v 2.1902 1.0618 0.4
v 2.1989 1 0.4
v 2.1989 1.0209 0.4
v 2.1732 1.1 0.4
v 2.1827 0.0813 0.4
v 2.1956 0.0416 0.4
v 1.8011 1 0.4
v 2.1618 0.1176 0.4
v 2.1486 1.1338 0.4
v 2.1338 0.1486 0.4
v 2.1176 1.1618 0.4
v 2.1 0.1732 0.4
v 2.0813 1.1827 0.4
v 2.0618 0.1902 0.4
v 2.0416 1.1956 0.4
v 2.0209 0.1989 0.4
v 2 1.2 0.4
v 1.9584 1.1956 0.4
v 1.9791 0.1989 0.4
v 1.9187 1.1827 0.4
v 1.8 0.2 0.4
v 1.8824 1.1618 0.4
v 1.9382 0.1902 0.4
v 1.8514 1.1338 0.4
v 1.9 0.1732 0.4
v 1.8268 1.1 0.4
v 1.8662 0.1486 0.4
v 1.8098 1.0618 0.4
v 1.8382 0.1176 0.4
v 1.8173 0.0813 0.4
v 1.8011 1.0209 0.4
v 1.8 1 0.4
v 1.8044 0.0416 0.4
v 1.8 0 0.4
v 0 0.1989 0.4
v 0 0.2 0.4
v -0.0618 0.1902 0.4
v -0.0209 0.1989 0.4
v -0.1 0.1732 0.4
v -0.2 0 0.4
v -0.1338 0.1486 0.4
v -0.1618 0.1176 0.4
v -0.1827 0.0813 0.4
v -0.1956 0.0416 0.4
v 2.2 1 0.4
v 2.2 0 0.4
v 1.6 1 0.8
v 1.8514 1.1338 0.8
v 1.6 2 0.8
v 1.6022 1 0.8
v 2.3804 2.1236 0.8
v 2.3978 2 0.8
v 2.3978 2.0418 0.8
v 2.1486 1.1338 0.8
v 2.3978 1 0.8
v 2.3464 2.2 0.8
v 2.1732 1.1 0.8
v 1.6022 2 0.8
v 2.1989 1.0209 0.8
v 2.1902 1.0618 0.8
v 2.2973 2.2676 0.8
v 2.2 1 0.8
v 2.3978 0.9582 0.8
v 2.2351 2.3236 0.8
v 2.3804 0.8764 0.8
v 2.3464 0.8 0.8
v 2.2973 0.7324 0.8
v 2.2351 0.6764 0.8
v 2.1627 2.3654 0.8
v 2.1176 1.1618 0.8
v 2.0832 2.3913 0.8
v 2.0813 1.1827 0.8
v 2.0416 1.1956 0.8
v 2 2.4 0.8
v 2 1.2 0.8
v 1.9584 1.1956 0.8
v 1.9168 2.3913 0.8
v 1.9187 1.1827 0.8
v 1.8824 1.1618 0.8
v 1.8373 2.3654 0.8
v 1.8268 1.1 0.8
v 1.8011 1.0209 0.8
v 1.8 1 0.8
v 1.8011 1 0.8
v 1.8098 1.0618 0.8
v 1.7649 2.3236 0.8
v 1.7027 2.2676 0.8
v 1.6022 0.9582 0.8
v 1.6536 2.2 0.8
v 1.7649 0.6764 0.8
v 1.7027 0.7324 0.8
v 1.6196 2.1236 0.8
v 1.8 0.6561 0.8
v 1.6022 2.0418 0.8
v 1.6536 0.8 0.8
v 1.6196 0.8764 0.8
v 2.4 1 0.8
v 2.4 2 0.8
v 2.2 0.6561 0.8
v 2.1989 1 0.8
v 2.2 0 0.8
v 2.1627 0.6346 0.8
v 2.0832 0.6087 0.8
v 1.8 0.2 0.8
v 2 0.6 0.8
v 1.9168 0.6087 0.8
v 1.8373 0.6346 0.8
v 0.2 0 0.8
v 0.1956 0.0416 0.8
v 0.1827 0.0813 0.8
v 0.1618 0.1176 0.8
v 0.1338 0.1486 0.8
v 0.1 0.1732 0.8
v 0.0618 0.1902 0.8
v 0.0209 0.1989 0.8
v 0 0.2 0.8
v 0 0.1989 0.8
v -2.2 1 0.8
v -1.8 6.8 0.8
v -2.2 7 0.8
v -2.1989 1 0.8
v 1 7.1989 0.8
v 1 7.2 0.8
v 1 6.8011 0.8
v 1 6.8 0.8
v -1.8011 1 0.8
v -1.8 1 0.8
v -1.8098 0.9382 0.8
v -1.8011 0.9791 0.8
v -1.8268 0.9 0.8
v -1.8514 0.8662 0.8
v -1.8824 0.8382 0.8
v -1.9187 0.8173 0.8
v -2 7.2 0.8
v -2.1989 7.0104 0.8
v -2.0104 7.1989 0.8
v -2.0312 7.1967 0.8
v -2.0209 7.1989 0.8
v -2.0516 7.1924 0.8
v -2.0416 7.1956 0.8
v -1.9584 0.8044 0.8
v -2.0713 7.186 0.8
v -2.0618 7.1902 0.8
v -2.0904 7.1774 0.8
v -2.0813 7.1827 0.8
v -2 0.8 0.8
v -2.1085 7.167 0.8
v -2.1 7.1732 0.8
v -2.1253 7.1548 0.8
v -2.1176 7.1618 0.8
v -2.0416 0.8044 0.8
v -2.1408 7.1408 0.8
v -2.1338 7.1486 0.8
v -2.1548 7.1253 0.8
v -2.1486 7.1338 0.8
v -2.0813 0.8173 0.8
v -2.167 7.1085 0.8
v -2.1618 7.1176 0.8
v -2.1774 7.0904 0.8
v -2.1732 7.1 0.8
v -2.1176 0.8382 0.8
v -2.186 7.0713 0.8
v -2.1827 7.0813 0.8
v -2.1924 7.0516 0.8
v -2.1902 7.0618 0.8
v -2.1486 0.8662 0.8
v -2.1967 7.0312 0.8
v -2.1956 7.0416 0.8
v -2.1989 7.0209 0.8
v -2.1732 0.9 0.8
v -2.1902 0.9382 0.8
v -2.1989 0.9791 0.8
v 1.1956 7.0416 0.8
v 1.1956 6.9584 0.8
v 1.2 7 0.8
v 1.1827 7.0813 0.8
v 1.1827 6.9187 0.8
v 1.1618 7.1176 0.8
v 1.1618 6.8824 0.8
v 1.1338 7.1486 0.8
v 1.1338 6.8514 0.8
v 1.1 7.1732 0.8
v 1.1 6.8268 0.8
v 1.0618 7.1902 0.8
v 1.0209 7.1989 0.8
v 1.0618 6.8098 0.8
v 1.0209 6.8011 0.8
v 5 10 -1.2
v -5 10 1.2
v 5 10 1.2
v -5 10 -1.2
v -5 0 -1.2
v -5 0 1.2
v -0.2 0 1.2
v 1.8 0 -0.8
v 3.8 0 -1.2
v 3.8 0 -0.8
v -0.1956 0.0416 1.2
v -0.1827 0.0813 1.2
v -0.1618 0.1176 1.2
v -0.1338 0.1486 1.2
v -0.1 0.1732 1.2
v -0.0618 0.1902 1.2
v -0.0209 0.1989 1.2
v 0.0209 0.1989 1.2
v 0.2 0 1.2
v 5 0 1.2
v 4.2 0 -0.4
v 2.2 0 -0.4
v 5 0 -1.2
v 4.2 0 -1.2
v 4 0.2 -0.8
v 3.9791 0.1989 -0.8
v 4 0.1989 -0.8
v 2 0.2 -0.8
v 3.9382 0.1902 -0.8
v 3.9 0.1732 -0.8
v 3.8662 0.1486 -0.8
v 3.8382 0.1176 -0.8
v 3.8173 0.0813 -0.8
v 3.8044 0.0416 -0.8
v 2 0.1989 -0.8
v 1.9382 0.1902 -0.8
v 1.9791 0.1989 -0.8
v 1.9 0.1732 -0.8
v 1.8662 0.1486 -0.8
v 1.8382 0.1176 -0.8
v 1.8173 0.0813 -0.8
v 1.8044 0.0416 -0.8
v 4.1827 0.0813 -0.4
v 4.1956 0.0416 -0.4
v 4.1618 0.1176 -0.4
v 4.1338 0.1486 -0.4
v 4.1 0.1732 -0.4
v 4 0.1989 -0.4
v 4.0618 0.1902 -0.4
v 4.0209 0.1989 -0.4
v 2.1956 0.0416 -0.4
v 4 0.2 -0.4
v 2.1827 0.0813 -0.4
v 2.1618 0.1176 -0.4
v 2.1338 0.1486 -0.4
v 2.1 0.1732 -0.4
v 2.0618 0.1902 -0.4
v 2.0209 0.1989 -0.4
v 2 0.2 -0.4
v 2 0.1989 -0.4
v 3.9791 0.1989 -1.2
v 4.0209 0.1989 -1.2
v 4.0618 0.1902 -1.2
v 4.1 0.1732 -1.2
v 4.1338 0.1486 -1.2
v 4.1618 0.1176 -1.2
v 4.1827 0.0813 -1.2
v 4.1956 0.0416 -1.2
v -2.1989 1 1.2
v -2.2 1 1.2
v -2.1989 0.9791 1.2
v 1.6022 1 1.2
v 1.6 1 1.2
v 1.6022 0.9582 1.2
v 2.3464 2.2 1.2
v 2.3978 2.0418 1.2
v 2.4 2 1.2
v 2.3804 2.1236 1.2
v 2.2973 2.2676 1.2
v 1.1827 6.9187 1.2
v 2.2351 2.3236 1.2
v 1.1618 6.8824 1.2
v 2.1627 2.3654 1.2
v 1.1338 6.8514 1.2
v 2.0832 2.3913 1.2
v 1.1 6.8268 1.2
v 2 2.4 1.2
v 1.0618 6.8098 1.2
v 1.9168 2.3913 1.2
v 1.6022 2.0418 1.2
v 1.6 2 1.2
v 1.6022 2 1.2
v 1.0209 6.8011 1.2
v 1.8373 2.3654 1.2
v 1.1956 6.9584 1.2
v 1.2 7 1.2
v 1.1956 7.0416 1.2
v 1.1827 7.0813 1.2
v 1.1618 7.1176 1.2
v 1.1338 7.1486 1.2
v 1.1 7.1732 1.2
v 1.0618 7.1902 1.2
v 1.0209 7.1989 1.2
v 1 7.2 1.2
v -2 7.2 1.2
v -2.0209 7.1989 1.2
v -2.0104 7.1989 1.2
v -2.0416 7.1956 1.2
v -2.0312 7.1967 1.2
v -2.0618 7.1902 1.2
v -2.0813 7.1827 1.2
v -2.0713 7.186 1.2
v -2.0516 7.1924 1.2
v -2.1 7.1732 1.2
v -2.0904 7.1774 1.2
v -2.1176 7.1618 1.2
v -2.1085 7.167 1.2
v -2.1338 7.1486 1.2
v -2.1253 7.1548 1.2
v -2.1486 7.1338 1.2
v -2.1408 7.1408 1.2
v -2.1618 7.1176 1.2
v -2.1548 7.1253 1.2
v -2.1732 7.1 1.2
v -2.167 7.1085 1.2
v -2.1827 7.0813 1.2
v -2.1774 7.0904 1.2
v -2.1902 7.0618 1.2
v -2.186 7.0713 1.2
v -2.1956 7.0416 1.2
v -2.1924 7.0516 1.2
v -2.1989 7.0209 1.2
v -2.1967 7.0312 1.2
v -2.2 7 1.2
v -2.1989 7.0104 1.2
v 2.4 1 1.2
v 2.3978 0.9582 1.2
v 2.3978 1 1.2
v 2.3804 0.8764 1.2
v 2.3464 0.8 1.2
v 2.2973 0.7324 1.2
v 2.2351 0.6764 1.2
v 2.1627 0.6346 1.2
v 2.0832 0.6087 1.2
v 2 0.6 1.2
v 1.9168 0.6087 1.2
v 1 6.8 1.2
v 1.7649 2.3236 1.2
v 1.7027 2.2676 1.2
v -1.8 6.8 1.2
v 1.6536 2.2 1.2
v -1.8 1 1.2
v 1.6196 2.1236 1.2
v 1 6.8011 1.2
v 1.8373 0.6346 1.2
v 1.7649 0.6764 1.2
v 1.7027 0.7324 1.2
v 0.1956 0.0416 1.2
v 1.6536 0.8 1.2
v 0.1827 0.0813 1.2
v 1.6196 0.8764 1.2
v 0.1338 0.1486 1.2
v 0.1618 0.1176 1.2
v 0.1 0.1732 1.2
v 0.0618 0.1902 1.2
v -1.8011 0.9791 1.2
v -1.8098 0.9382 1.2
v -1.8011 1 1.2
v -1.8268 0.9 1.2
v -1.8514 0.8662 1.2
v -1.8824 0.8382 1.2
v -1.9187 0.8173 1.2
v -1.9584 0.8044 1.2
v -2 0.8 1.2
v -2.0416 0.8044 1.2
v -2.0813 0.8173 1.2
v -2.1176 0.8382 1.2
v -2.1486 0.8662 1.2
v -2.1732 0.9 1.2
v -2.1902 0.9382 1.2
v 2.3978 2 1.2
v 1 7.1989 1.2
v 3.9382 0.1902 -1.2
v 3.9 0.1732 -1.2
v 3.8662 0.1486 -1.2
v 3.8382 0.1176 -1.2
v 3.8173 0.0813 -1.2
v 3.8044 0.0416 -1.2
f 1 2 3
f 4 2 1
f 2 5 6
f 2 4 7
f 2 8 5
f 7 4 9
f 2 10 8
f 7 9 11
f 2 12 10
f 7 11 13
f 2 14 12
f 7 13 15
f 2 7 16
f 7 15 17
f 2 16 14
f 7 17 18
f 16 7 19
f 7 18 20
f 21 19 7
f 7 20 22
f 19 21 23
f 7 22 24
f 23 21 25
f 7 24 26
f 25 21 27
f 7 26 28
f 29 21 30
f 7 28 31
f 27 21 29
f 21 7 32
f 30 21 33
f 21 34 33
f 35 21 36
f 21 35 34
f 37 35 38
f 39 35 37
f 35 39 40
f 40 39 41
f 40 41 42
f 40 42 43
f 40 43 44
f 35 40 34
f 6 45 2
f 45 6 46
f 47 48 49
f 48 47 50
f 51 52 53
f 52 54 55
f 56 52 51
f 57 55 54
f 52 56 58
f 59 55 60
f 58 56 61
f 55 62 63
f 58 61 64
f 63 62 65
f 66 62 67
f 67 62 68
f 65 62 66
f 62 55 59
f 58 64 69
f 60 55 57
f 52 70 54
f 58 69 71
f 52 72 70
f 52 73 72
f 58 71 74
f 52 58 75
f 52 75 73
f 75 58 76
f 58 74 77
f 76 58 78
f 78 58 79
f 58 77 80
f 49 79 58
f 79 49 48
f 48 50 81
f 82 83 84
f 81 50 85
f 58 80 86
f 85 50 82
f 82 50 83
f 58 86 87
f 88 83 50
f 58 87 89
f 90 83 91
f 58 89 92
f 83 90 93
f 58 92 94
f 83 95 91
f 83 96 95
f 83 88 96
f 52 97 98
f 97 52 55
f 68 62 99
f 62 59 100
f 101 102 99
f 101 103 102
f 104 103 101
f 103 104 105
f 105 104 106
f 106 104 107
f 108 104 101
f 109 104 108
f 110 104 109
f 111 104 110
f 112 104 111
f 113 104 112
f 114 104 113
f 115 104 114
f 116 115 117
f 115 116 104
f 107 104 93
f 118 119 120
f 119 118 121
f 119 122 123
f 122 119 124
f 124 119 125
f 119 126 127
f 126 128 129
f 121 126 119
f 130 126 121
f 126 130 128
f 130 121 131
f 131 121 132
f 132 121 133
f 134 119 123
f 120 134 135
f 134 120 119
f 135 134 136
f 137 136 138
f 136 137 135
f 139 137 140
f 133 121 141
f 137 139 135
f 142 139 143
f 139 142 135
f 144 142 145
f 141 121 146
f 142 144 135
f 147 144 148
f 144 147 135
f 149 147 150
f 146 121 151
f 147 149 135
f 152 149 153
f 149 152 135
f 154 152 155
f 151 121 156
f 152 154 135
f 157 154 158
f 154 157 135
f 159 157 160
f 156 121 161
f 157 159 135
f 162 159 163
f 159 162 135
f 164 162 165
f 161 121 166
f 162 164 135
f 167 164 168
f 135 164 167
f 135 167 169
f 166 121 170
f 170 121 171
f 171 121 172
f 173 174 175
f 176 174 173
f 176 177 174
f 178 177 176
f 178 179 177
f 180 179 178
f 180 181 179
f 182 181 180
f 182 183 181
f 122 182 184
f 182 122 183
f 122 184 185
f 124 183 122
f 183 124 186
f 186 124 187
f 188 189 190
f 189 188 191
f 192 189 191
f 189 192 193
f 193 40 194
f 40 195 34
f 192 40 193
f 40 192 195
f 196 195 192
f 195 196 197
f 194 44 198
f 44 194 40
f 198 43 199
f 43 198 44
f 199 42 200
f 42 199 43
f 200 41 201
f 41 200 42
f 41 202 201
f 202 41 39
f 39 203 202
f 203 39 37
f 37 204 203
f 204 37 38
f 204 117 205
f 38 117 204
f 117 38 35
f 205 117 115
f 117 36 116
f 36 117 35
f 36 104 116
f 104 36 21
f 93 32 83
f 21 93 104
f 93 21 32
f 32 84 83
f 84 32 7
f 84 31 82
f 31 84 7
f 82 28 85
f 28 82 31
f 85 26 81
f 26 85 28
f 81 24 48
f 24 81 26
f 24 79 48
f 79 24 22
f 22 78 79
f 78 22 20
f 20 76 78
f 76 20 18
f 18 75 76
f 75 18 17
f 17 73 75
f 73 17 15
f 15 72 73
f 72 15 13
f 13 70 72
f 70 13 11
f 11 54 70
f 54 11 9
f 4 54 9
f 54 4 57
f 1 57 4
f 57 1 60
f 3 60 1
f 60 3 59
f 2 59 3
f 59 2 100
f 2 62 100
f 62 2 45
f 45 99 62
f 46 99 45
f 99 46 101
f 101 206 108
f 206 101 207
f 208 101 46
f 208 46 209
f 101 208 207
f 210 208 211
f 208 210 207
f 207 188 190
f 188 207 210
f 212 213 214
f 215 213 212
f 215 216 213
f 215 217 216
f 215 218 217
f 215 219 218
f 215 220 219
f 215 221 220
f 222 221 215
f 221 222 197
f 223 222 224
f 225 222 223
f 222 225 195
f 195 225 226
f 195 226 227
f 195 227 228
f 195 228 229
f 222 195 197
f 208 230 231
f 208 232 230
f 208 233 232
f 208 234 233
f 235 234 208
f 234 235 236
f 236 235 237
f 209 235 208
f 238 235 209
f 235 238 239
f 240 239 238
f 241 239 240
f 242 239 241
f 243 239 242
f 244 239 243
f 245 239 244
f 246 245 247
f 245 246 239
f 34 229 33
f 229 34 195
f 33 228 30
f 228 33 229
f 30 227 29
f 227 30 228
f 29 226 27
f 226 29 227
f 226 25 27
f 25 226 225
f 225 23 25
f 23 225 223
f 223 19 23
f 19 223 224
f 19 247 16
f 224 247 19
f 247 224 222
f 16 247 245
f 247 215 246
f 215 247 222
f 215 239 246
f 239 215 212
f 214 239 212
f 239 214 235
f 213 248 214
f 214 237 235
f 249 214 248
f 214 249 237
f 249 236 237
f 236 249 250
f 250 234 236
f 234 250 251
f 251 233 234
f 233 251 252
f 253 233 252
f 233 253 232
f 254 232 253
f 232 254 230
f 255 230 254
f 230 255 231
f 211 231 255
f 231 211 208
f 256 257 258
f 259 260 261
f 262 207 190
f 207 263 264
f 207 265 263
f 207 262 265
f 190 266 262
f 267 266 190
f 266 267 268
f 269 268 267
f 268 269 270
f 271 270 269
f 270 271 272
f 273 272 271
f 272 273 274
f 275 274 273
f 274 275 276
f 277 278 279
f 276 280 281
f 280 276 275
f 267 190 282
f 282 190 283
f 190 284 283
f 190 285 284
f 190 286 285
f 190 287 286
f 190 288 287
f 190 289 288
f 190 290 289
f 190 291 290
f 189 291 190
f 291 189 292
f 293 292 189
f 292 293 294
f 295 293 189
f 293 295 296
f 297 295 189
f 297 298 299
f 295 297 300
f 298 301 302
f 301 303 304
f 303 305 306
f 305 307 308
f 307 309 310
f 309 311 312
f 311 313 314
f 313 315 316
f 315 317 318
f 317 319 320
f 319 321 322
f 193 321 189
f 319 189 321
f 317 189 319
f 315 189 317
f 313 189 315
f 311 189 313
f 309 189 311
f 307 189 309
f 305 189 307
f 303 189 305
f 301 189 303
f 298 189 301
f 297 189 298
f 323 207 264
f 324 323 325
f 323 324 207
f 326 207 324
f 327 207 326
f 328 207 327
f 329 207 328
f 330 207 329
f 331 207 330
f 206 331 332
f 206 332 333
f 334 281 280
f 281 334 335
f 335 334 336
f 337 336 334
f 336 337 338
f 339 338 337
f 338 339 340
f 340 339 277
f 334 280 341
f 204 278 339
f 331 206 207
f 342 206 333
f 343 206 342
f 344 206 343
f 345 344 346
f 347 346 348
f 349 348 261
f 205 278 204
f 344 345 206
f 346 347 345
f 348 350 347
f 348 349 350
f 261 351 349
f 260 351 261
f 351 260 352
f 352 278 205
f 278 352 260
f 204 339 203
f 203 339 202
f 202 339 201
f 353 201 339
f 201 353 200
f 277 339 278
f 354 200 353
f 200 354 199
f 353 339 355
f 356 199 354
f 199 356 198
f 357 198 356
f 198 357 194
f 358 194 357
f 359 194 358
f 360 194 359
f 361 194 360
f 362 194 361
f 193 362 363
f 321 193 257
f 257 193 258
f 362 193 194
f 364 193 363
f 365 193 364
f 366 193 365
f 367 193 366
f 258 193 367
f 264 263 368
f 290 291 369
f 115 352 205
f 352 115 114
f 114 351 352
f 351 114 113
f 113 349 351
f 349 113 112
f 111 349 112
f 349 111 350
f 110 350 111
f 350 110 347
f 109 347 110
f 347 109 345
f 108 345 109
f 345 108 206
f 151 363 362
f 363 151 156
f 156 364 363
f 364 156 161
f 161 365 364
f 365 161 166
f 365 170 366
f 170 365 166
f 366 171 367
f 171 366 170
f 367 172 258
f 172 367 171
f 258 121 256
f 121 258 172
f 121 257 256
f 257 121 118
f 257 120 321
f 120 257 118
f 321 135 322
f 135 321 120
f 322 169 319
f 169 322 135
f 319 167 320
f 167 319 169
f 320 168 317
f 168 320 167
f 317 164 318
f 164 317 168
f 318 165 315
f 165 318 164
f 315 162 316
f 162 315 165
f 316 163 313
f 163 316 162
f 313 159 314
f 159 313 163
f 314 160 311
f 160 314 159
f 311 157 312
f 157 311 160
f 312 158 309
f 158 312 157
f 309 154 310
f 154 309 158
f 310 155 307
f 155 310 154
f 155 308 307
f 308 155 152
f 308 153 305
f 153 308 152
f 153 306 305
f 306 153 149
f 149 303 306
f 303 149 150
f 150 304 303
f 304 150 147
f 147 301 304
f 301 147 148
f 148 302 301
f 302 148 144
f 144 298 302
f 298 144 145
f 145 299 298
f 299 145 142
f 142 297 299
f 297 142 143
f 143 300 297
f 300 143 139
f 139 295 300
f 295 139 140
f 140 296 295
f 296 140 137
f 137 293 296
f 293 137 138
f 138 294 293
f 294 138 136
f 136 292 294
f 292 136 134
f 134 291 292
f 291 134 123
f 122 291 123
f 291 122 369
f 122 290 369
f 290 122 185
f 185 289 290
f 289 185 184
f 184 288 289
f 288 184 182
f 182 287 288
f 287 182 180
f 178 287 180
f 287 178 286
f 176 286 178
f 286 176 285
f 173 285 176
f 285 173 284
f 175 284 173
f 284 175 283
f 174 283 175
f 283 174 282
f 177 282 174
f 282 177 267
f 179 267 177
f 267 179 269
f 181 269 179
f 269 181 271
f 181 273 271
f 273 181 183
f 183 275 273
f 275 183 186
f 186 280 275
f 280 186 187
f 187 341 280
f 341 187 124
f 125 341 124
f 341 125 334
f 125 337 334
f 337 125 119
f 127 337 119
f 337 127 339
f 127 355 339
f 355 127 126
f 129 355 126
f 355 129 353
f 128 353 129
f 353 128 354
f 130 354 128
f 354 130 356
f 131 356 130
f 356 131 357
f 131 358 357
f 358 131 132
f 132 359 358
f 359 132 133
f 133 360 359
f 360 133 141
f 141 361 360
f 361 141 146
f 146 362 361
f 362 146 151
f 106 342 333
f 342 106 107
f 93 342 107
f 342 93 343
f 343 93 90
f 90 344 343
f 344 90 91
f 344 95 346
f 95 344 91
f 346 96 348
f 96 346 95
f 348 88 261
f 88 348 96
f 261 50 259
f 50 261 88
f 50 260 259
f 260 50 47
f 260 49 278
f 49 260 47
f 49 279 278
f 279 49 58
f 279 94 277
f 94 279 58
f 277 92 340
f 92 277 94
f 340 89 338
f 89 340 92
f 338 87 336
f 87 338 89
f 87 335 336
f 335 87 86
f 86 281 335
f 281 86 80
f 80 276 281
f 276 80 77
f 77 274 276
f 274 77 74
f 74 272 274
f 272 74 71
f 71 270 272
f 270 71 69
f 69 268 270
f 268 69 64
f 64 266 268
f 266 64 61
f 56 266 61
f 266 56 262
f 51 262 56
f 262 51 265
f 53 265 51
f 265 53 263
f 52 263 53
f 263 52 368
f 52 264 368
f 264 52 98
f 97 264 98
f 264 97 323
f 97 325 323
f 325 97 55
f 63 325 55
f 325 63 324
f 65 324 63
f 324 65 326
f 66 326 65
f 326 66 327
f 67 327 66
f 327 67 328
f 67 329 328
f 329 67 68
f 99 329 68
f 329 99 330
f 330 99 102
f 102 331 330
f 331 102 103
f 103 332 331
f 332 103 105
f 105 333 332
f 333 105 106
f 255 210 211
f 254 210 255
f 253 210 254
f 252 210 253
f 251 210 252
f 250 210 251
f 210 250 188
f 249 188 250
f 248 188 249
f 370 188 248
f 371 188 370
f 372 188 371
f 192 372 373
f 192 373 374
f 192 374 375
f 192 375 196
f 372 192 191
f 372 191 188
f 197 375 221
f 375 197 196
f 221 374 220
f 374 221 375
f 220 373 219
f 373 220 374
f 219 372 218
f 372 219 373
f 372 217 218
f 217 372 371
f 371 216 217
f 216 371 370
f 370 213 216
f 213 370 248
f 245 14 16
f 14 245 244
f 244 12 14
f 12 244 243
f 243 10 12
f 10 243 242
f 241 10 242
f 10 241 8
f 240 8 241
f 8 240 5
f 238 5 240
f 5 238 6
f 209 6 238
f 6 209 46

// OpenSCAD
// file: ../lib/kicad_graphics_items.scad
$fs = 0.01;

module draw_segment(
    start, // start point as 2-vector
    end, // end point as 2-vector
    width // width as number
) {
    vector = end - start;
    length = norm(vector);
    angle = atan2(vector[1], vector[0]);
    
    translate(start)
    rotate(angle) {
        translate([0, -width/2])
            square([length, width]);
        circle(d = width);
        translate([length, 0])
            circle(d = width);
    }
}

module draw_fp_line(
    start, // start point as 2-vector
    end, // end point as 2-vector
    width // width as number
) {
    draw_segment(
        start = start,
        end = end,
        width = width
    );
}

module draw_gr_poly(
    vertices, // list of vertices, as 2-vectors
    width, // stroke line width as number
    fill // whether to fill the shape, as boolean
) {
    for(i = [0 : len(vertices) - 2]) {
        draw_segment(
            start = vertices[i],
            end = vertices[i+1],
            width = width
        );
    }
    draw_segment(
        start = vertices[len(vertices) - 1],
        end = vertices[0],
        width = width
    );
    if(fill)
    polygon([
        for(v = vertices) v
    ]);
}

module draw_gr_rect(
    start, // start point as 2-vector
    end, // end point as 2-vector
    width, // stroke line width as number
    fill // whether to fill the shape, as boolean
) {
    draw_gr_poly(
        [
            start, [end.x, start.y],
            end, [start.x, end.y]
        ],
        width = width,
        fill = fill
    );
}

draw_fp_line([4, 5], [6, 7], 1);
// main file
use <../lib/kicad_graphics_items.scad>

// F.Cu
color("#ff8080")
translate([0, 0, 0.4])
linear_extrude(0.4)
difference() {
    translate([-5, 0, 0])
    square([10, 10]);
    draw_fp_line(
        start = [0.0, 0.0],
        end = [2.0, 0.0],
        width = 0.4
    );
    draw_fp_line(
        start = [2.0, 0.0],
        end = [2.0, 1.0],
        width = 0.4
    );
}

// B.Cu
color("#8080ff")
translate([0, 0, -0.8])
linear_extrude(0.4)
difference() {
    translate([-5, 0, 0])
    square([10, 10]);
    draw_fp_line(
        start = [2.0, 0.0],
        end = [4.0, 0.0],
        width = 0.4
    );
}

// F.Mask
color("#80ff80")
translate([0, 0, 0.8])
linear_extrude(0.4)
difference() {
    translate([-5, 0, 0])
    square([10, 10]);
    draw_fp_line(
        start = [0.0, 0.0],
        end = [0.0, 0.0],
        width = 0.4
    );
    draw_fp_line(
        start = [2.0, 1.0],
        end = [2.0, 2.0],
        width = 0.8
    );
    draw_fp_line(
        start = [-2.0, 1.0],
        end = [-2.0, 7.0],
        width = 0.4
    );
    draw_fp_line(
        start = [-2.0, 7.0],
        end = [1.0, 7.0],
        width = 0.4
    );
}

// B.Mask
color("#80ff80")
translate([0, 0, -1.2])
linear_extrude(0.4)
difference() {
    translate([-5, 0, 0])
    square([10, 10]);
    draw_fp_line(
        start = [4.0, 0.0],
        end = [4.0, 0.0],
        width = 0.4
    );
}

// Dielectric
color("#808080")
translate([0, 0, -0.4])
linear_extrude(0.8)
difference() {
    translate([-5, 0, 0])
    square([10, 10]);
    draw_fp_line(
        start = [2.0, 0.0],
        end = [2.0, 0.0],
        width = 0.4
    );
}
